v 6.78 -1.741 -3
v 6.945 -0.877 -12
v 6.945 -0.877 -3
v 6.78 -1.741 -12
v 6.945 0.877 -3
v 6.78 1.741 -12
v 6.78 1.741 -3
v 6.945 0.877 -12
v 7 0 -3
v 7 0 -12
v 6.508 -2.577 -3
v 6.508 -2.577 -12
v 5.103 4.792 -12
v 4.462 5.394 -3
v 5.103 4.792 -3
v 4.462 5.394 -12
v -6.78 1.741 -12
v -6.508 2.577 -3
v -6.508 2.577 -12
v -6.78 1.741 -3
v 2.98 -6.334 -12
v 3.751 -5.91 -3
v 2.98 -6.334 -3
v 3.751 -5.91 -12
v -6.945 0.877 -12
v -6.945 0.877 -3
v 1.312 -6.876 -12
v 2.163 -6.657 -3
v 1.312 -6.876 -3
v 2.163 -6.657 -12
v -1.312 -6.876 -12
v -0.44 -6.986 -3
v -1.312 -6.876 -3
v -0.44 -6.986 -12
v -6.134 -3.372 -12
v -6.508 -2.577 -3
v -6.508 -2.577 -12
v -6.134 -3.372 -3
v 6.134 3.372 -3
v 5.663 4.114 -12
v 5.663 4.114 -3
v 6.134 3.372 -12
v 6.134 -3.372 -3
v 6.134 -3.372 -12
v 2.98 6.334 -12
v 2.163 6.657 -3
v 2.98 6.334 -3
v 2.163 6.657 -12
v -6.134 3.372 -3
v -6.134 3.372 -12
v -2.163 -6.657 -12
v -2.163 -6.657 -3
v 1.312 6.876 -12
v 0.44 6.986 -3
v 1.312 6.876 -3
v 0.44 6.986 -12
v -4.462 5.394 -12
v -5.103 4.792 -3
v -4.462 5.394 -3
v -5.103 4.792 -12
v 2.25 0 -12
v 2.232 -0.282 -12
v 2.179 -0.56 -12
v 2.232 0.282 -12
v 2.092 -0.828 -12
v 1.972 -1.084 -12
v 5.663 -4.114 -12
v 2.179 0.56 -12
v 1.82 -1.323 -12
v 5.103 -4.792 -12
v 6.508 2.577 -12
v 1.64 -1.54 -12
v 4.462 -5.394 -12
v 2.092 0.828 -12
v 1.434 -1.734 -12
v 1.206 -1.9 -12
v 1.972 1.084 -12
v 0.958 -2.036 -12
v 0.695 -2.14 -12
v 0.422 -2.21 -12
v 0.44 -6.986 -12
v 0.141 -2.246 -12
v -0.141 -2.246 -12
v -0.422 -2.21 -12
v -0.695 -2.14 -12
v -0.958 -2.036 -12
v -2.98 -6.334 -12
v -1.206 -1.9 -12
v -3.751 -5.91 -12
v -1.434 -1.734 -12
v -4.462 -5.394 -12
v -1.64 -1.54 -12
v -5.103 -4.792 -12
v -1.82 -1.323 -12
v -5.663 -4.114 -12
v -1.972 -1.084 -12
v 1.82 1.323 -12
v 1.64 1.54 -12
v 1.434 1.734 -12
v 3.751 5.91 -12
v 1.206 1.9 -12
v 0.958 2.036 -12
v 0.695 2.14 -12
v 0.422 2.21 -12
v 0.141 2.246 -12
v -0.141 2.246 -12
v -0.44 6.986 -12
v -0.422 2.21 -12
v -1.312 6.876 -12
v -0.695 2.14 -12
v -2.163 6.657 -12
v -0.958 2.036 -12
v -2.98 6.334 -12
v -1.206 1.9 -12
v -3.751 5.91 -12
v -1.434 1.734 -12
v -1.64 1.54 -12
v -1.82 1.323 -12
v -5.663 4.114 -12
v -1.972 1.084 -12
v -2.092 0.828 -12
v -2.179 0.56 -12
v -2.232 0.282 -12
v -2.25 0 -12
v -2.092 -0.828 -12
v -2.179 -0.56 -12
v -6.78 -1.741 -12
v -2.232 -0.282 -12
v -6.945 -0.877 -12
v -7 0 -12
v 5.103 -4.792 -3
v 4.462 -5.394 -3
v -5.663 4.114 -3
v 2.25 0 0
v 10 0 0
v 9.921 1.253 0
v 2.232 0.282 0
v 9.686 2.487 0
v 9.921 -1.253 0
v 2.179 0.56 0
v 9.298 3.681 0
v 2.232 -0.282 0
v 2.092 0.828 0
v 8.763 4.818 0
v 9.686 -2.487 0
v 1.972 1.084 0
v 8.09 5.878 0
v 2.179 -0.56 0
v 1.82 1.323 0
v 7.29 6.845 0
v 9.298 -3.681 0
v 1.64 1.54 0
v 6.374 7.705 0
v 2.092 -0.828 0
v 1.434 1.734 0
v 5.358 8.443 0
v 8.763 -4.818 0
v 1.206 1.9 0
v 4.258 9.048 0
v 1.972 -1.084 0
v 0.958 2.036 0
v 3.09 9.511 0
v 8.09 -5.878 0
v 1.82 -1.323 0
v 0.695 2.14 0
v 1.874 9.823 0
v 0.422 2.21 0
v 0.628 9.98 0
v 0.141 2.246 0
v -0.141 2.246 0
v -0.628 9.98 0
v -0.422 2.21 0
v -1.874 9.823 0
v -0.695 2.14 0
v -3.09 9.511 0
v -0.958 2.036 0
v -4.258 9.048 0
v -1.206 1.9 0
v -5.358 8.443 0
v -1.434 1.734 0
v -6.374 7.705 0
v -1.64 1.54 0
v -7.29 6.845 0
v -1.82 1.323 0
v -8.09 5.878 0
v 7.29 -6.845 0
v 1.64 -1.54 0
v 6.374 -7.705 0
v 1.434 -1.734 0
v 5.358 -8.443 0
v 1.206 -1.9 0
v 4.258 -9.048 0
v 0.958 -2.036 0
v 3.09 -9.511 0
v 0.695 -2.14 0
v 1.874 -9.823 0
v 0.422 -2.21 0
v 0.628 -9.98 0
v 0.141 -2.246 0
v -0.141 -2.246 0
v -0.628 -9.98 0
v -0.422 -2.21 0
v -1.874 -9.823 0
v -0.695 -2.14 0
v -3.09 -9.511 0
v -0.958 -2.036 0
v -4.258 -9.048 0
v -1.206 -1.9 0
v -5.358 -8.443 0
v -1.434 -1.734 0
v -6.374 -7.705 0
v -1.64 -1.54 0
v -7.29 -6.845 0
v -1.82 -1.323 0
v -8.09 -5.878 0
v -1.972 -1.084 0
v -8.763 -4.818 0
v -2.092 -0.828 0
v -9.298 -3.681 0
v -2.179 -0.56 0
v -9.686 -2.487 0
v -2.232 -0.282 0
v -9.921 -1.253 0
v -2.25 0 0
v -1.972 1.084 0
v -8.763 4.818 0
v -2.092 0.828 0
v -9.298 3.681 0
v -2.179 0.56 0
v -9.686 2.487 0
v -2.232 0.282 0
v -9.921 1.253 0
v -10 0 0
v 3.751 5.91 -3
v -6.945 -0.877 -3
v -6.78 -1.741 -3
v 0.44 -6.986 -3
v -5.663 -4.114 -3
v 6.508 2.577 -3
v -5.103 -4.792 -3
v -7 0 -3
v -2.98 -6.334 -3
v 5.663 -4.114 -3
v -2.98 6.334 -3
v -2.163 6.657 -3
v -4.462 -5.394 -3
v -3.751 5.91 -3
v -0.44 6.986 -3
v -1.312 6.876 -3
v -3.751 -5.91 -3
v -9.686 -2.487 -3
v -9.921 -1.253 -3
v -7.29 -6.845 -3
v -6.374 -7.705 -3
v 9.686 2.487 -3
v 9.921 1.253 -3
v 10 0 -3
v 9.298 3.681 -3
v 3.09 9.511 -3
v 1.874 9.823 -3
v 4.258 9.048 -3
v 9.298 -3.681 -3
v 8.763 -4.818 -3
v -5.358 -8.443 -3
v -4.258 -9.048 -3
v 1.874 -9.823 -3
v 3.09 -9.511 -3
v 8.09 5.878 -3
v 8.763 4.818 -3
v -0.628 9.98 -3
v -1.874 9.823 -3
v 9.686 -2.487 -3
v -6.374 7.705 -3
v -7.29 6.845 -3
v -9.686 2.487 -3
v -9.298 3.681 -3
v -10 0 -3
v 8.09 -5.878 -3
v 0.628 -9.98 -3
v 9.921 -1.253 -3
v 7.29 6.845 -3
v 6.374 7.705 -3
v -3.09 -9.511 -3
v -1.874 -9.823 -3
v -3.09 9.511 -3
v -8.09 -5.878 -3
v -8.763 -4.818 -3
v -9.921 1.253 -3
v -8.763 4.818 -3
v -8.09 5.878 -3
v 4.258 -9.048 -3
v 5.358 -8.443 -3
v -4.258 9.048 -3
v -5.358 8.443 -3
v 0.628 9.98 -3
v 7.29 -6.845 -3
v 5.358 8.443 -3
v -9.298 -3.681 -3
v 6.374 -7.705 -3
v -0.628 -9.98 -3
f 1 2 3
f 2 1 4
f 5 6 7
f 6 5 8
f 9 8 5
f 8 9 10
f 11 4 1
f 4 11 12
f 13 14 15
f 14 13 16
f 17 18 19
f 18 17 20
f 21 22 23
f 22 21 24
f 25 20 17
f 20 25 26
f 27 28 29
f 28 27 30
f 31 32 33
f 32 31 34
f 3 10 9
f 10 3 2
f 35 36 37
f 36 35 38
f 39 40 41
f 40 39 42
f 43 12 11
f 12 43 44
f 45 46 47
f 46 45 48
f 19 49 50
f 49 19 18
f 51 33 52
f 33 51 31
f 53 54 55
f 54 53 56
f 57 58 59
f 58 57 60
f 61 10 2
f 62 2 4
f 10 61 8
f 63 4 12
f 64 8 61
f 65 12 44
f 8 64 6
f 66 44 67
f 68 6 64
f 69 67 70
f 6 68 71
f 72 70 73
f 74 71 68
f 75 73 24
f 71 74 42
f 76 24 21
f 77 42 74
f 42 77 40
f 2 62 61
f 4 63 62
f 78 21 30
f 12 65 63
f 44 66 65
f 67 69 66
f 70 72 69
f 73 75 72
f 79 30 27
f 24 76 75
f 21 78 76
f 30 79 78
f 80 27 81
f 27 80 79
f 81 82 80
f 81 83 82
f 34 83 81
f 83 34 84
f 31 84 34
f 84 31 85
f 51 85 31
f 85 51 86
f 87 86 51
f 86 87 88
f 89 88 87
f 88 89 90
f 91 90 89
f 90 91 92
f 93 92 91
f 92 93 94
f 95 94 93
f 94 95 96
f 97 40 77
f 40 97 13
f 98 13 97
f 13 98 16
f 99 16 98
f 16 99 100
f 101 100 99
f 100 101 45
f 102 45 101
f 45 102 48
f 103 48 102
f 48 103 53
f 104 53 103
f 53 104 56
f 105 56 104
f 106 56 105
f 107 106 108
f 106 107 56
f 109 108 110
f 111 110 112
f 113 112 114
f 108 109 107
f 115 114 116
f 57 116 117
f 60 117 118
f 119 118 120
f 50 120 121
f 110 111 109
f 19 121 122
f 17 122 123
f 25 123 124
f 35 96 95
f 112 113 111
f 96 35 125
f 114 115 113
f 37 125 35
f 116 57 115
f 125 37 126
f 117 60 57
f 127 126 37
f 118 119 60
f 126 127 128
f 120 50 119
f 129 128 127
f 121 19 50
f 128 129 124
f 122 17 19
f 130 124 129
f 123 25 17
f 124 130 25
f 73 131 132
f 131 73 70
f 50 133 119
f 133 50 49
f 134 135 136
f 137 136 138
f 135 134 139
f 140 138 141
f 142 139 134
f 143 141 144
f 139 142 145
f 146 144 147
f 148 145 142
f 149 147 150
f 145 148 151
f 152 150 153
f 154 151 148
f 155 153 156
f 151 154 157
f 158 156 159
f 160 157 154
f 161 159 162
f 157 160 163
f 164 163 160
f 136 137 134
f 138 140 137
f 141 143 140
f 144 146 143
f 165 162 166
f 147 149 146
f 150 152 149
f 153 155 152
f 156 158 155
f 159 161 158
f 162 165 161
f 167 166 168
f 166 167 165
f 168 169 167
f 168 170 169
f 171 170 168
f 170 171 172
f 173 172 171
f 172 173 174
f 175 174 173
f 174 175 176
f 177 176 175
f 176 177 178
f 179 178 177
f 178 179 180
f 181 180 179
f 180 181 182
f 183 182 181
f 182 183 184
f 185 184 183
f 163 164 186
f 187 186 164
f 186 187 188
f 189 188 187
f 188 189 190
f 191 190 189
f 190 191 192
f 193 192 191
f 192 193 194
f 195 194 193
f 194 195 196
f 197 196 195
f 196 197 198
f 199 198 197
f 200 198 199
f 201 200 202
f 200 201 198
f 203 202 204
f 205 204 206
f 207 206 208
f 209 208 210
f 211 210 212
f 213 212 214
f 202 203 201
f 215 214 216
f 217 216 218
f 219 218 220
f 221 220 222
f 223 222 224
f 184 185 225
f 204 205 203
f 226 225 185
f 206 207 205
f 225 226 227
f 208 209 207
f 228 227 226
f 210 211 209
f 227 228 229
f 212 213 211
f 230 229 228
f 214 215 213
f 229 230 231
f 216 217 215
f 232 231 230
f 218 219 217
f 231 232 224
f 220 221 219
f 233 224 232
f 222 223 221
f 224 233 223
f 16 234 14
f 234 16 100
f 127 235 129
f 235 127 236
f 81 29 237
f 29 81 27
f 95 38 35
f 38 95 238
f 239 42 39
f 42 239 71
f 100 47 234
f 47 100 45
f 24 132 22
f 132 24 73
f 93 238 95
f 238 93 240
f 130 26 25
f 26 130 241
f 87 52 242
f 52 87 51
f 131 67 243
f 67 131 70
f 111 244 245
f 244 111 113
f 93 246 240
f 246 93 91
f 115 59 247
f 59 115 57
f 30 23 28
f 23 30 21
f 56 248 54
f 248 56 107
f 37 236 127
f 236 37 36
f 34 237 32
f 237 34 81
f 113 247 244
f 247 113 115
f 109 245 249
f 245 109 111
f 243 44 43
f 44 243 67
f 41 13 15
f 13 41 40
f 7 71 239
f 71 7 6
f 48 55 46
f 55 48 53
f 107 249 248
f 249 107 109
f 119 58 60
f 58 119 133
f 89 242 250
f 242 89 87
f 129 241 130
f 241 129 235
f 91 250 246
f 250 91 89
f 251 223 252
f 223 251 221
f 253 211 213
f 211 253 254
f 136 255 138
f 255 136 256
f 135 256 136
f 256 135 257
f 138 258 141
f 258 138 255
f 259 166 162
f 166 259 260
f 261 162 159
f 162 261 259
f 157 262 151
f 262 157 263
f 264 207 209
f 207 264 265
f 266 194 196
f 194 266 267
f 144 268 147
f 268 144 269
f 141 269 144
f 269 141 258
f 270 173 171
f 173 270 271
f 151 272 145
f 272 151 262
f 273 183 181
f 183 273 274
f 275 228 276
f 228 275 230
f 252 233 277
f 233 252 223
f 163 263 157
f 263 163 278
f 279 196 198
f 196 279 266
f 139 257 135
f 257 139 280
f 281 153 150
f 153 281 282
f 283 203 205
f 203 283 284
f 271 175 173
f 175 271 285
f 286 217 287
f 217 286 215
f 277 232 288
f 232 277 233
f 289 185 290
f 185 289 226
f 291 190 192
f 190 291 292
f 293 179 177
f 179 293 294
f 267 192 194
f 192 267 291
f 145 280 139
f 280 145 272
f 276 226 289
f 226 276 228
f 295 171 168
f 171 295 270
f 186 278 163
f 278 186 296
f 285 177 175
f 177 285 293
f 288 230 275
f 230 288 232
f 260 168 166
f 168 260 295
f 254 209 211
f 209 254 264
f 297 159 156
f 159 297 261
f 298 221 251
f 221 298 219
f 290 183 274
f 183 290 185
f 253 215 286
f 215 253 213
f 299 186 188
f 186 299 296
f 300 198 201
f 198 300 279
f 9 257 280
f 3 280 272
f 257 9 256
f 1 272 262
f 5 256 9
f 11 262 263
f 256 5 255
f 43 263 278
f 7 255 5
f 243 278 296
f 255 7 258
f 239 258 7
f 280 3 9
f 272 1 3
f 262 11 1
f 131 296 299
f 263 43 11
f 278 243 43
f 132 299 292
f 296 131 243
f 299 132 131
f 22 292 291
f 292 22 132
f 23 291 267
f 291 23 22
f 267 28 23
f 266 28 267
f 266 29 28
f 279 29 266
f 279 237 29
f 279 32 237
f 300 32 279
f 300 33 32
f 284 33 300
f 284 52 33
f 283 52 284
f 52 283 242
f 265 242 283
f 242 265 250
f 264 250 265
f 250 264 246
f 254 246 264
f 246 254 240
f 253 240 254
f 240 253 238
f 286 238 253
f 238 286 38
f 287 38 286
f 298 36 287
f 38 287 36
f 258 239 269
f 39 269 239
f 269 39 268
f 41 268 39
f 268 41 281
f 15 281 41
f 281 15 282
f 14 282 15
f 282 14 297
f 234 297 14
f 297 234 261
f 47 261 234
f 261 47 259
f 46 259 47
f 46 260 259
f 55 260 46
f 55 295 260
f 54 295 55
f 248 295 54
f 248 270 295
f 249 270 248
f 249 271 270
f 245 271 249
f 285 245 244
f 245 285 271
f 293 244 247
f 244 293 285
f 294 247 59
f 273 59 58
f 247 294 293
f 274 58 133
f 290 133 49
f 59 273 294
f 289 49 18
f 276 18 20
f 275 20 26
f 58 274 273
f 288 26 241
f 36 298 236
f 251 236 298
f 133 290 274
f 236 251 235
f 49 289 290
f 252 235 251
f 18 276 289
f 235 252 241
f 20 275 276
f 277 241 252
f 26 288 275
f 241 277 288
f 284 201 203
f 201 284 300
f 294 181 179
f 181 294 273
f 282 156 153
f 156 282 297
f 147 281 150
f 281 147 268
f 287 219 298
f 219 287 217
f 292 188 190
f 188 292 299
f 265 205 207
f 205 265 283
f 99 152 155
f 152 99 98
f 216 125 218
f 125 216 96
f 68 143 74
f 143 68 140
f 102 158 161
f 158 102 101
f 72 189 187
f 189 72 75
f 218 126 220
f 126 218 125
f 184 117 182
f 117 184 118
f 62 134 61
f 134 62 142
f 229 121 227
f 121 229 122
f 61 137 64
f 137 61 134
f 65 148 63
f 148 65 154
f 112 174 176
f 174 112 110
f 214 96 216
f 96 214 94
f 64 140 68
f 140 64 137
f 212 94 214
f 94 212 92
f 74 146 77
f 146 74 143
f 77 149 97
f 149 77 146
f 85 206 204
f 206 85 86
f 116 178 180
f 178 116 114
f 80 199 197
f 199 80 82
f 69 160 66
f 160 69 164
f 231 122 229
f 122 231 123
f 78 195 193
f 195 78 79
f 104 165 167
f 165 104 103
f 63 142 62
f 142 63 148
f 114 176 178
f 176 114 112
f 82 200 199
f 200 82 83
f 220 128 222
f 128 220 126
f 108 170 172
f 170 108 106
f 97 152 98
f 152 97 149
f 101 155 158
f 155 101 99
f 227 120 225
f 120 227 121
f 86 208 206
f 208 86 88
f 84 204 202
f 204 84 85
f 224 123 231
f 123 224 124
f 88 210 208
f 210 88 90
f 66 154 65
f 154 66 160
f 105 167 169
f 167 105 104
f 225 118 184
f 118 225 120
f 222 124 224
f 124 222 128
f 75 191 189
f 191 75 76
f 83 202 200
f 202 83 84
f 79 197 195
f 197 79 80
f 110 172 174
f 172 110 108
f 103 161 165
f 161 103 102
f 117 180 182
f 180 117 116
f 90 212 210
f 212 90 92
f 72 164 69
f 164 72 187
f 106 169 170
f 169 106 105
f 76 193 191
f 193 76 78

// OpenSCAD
$fn = 50;


difference() {
	union() {
		translate(v = [0, 0, -12.0000000000]) {
			cylinder(h = 12, r = 7.0000000000);
		}
		translate(v = [0, 0, -3.0000000000]) {
			cylinder(h = 3, r = 10.0000000000);
		}
	}
	union() {
		#translate(v = [0, 0, -12]) {
			cylinder(h = 12, r = 2.2500000000);
		}
	}
}
